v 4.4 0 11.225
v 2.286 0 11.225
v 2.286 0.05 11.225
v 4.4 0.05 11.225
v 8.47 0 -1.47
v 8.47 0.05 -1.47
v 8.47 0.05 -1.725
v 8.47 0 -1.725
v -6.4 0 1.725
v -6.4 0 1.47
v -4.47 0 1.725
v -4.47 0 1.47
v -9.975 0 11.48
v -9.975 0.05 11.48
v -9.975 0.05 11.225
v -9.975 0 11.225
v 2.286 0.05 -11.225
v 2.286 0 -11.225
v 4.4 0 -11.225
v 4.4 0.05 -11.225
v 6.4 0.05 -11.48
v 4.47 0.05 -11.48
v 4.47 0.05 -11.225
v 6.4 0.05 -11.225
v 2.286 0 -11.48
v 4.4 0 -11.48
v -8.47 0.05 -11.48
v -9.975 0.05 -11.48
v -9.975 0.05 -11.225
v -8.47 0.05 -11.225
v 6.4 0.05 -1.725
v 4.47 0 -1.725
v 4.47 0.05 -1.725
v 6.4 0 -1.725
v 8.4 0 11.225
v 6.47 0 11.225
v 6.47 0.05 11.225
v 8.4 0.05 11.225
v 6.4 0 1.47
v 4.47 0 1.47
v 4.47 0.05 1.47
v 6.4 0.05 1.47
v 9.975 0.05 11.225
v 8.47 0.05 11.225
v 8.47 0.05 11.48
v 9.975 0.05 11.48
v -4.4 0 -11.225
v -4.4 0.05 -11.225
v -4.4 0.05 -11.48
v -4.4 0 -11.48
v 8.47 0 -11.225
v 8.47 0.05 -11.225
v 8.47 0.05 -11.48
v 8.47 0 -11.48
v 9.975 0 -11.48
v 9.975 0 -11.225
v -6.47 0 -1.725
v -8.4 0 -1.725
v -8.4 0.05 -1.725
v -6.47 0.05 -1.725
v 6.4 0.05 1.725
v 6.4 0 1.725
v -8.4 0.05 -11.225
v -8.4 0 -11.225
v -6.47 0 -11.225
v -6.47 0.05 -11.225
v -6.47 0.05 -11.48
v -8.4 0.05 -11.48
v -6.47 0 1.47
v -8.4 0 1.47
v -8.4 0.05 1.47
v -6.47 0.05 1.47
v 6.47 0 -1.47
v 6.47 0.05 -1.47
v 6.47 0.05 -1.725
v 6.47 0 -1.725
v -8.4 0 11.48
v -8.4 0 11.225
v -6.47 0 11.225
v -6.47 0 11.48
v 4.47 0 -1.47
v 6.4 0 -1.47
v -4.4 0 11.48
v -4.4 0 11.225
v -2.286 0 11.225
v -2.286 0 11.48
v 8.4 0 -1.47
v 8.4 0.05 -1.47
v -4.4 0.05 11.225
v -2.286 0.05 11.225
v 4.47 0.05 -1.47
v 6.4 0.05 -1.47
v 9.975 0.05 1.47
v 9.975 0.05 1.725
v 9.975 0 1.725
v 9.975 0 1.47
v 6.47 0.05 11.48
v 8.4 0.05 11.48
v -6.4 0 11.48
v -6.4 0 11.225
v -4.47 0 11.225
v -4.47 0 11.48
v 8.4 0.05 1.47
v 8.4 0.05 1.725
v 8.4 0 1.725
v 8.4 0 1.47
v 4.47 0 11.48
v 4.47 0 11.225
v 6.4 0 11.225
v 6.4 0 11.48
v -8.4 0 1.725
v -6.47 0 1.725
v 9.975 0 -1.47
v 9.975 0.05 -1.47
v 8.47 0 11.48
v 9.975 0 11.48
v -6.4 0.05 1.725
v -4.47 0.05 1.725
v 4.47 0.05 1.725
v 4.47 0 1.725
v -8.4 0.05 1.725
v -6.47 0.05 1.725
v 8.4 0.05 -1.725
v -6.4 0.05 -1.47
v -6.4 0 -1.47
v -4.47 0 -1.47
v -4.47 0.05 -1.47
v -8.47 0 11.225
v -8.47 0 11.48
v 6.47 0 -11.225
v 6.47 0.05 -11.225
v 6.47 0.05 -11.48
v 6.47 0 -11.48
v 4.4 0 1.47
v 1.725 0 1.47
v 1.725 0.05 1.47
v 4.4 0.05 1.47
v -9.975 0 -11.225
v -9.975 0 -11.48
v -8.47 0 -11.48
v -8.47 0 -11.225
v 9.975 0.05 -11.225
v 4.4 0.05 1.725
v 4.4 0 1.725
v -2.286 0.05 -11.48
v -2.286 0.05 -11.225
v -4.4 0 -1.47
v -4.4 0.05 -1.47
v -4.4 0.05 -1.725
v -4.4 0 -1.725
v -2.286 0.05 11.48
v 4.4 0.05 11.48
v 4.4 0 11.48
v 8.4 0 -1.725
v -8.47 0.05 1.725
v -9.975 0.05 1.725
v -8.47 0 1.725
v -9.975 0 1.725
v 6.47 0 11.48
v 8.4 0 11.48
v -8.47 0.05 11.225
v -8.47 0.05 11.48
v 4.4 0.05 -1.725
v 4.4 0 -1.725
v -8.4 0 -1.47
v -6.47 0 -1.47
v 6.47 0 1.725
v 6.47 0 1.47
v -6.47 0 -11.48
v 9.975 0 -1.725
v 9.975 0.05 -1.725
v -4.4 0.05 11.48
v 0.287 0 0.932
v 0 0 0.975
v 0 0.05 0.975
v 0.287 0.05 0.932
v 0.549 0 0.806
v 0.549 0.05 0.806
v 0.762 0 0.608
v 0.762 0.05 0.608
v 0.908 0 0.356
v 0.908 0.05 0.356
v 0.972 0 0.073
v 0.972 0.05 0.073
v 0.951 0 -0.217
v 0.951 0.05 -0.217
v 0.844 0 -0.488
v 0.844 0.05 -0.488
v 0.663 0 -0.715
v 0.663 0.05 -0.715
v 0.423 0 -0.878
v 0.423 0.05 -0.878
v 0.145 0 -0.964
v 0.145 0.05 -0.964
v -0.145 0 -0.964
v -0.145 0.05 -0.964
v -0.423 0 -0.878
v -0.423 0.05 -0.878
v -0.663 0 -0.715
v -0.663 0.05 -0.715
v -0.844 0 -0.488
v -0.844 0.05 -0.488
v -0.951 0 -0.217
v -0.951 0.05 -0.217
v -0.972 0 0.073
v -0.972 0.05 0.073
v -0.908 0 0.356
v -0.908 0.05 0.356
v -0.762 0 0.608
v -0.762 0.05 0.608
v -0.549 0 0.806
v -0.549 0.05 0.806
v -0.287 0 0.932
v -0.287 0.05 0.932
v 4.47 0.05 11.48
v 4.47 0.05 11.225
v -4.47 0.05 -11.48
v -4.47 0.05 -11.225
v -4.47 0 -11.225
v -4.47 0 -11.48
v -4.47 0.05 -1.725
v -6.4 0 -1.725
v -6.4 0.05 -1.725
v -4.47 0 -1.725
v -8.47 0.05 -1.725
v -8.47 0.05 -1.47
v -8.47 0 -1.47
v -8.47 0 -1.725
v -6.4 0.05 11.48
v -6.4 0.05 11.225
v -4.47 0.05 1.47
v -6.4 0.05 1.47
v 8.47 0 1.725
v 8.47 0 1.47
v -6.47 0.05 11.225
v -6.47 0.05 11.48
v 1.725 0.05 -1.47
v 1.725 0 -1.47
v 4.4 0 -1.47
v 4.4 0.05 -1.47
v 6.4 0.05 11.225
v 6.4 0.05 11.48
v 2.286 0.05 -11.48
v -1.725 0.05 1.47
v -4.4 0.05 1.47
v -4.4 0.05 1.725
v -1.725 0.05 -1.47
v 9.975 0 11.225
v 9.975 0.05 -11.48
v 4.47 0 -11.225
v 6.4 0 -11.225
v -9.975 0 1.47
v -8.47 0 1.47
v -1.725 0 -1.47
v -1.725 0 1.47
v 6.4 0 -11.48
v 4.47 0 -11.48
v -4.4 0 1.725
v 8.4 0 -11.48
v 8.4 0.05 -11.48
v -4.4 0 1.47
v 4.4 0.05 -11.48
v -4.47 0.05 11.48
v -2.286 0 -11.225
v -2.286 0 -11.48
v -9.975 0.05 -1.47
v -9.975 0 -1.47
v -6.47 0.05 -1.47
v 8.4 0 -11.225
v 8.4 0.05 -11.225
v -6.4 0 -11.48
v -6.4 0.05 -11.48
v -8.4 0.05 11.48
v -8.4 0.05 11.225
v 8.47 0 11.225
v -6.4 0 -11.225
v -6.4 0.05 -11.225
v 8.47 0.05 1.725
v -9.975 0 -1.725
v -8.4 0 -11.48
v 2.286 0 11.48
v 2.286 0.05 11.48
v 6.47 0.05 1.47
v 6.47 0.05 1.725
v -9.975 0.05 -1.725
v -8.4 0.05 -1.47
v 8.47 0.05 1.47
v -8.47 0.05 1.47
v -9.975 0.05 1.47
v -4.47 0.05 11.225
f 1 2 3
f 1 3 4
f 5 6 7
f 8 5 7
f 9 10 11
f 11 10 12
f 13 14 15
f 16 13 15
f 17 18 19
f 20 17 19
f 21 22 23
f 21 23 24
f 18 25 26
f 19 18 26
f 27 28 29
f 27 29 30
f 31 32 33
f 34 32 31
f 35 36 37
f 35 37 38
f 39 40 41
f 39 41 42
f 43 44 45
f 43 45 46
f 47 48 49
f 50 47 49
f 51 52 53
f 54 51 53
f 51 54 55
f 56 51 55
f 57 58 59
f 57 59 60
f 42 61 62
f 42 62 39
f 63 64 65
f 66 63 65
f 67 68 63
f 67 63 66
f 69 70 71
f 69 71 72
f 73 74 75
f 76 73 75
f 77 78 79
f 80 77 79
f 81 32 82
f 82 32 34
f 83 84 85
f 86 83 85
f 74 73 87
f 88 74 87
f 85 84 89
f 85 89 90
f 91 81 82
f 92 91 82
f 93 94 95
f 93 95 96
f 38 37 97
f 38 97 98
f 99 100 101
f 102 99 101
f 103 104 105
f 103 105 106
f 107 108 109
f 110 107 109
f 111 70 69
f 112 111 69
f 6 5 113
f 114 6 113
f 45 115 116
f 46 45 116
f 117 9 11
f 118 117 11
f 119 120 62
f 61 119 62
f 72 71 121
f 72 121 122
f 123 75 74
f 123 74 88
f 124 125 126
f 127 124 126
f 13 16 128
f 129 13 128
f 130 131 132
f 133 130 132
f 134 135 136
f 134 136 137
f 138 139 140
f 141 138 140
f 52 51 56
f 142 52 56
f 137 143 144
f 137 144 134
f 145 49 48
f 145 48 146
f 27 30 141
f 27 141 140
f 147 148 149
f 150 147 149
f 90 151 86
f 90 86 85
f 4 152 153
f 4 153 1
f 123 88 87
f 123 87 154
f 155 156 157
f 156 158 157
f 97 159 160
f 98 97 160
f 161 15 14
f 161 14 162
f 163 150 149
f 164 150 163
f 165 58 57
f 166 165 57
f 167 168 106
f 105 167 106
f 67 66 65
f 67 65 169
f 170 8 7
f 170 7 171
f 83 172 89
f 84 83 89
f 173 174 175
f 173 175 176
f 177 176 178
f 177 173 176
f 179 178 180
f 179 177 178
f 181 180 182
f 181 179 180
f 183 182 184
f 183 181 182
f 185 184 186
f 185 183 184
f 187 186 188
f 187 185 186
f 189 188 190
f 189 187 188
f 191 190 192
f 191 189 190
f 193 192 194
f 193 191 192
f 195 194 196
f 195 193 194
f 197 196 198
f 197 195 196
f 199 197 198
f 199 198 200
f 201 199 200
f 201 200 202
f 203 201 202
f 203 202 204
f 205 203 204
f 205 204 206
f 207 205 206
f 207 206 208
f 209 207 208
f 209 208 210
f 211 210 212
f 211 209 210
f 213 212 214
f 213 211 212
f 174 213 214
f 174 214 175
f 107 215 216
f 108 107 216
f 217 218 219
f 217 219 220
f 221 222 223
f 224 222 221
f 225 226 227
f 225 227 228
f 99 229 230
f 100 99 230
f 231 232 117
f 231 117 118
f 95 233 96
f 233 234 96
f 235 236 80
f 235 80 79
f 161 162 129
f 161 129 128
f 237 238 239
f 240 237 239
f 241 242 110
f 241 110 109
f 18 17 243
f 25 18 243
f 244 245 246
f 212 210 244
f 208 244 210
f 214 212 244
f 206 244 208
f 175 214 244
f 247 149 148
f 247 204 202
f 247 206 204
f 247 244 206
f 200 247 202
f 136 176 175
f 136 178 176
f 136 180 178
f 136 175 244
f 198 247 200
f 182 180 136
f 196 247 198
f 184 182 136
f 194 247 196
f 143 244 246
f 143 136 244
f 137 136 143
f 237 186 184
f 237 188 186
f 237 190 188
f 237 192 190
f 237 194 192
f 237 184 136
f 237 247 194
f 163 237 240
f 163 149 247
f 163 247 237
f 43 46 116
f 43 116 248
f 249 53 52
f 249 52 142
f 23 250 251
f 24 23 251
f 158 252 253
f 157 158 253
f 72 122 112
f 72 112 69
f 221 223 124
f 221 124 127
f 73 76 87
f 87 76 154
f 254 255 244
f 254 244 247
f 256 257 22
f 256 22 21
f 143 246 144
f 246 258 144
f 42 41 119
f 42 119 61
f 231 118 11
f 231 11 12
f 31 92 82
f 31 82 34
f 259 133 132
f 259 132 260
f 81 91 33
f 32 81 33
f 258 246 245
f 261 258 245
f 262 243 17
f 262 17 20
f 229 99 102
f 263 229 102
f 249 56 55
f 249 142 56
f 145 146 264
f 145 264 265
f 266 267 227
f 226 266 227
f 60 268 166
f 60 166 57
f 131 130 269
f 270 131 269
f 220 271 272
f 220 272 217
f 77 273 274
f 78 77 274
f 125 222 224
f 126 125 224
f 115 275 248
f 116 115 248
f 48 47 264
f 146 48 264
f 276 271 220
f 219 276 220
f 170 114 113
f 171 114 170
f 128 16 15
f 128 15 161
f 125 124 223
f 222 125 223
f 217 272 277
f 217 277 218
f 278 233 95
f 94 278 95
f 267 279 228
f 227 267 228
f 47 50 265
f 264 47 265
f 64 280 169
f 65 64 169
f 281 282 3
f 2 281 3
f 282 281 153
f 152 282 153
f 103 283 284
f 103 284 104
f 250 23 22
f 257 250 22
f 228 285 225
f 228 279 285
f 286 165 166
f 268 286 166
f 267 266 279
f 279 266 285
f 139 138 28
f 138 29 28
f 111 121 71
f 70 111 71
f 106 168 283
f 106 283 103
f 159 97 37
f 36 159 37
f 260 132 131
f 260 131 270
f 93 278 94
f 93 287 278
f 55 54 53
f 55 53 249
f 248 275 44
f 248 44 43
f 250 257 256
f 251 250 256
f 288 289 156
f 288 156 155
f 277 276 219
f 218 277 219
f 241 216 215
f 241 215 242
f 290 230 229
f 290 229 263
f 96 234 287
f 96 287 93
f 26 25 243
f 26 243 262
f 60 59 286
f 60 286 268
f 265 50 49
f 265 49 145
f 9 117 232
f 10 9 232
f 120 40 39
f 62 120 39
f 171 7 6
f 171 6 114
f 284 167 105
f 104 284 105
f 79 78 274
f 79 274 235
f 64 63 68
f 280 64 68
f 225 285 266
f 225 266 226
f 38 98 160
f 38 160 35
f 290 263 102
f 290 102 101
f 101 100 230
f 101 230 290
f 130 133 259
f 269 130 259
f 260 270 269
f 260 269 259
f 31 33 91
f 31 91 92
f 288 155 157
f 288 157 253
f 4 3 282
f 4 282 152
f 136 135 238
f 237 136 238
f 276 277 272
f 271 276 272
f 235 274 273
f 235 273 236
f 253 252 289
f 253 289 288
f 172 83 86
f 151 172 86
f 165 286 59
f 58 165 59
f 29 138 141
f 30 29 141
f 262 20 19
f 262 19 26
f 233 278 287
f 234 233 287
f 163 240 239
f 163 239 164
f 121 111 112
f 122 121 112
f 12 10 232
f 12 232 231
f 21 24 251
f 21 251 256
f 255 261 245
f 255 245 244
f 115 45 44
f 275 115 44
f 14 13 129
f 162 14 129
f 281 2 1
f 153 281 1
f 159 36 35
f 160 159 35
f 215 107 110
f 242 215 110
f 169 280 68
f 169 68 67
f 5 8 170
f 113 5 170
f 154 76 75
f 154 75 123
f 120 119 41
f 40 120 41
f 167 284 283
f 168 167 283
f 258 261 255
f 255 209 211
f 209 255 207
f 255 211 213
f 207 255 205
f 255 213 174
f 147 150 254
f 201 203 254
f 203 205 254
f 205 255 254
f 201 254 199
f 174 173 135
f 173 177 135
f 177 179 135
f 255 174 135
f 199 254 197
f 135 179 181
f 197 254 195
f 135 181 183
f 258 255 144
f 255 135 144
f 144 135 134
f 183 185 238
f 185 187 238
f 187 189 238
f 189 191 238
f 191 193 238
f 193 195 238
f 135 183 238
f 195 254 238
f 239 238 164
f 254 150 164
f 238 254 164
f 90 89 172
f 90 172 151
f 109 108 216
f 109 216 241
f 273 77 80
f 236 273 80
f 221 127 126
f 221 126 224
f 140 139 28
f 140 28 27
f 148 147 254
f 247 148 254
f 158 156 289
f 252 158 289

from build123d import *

# Parameters (mm, degrees)
SKETCH1_W           = 22.96
SKETCH1_H           = 22.96
SKETCH1_W_2         = 22.45
SKETCH1_H_2         = 22.45
SKETCH1_W_3         = 9.5
SKETCH1_H_3         = 0.255
SKETCH1_W_4         = 3.45
SKETCH1_H_4         = 3.45
SKETCH1_R           = 0.975
SKETCH1_W_5         = 0.25
SKETCH1_H_5         = 1
BOSS_EXTRUDE5_DEPTH = 0.05
SKETCH2_W           = 0.07
SKETCH2_H           = 0.5
CUT_EXTRUDE1_DEPTH  = 10
SKETCH3_W           = 1.755
SKETCH3_H           = 22.96
SKETCH3_W_2         = 4.572426812
SKETCH3_H_2         = 9.755
CUT_EXTRUDE2_DEPTH  = 10


with BuildPart() as part:
    # Sketch1 → Boss-Extrude5 (new body)
    # profile 1 of 8: a face of its own
    with BuildSketch(Plane(origin=(0, 0, 0), x_dir=(1, 0, 0), z_dir=(0, 1, 0))):
        Rectangle(SKETCH1_W, SKETCH1_H)
        Rectangle(SKETCH1_W_2, SKETCH1_H_2, mode=Mode.SUBTRACT)
    # profile 2 of 8: a face of its own
    with BuildSketch(Plane(origin=(0, 0, 0), x_dir=(1, 0, 0), z_dir=(0, 1, 0))):
        with Locations((-6.475, -1.5975)):
            Rectangle(SKETCH1_W_3, SKETCH1_H_3)
    # profile 3 of 8: a face of its own
    with BuildSketch(Plane(origin=(0, 0, 0), x_dir=(1, 0, 0), z_dir=(0, 1, 0))):
        with Locations((-6.475, 1.5975)):
            Rectangle(SKETCH1_W_3, SKETCH1_H_3)
    # profile 4 of 8: a face of its own
    with BuildSketch(Plane(origin=(0, 0, 0), x_dir=(1, 0, 0), z_dir=(0, 1, 0))):
        Rectangle(SKETCH1_W_4, SKETCH1_H_4)
        with Locations(Location((0, 0, 0), (0, 0, 270))):
            Circle(SKETCH1_R, mode=Mode.SUBTRACT)
    # profile 5 of 8: a face of its own
    with BuildSketch(Plane(origin=(0, 0, 0), x_dir=(1, 0, 0), z_dir=(0, 1, 0))):
        with Locations((6.475, 1.5975)):
            Rectangle(SKETCH1_W_3, SKETCH1_H_3)
    # profile 6 of 8: a face of its own
    with BuildSketch(Plane(origin=(0, 0, 0), x_dir=(1, 0, 0), z_dir=(0, 1, 0))):
        with Locations((6.475, -1.5975)):
            Rectangle(SKETCH1_W_3, SKETCH1_H_3)
    # profile 7 of 8: a face of its own
    with BuildSketch(Plane(origin=(0, 0, 0), x_dir=(1, 0, 0), z_dir=(0, 1, 0))):
        with Locations((-11.605, -1.95)):
            Rectangle(SKETCH1_W_5, SKETCH1_H_5)
    # profile 8 of 8: a face of its own
    with BuildSketch(Plane(origin=(0, 0, 0), x_dir=(1, 0, 0), z_dir=(0, 1, 0))):
        with Locations((-11.605, 1.95)):
            Rectangle(SKETCH1_W_5, SKETCH1_H_5)
    extrude(amount=BOSS_EXTRUDE5_DEPTH)

    # Sketch2 → Cut-Extrude1 (cut)
    with BuildSketch(Plane(origin=(0, 0.05, 0), x_dir=(1, 0, 0), z_dir=(0, 1, 0))):
        with Locations((-6.435, 1.475)):
            Rectangle(SKETCH2_W, SKETCH2_H)
        with Locations((-8.435, 1.475)):
            Rectangle(SKETCH2_W, SKETCH2_H)
        with Locations((-4.435, 1.475)):
            Rectangle(SKETCH2_W, SKETCH2_H)
        with Locations((-4.435, 11.475)):
            Rectangle(SKETCH2_W, SKETCH2_H)
        with Locations((-6.435, 11.475)):
            Rectangle(SKETCH2_W, SKETCH2_H)
        with Locations((-8.435, 11.475)):
            Rectangle(SKETCH2_W, SKETCH2_H)
        with Locations((4.435, 1.475)):
            Rectangle(SKETCH2_W, SKETCH2_H)
        with Locations((6.435, 1.475)):
            Rectangle(SKETCH2_W, SKETCH2_H)
        with Locations((8.435, 1.475)):
            Rectangle(SKETCH2_W, SKETCH2_H)
        with Locations((4.435, 11.475)):
            Rectangle(SKETCH2_W, SKETCH2_H)
        with Locations((6.435, 11.475)):
            Rectangle(SKETCH2_W, SKETCH2_H)
        with Locations((8.435, 11.475)):
            Rectangle(SKETCH2_W, SKETCH2_H)
        with Locations((-8.435, -11.475)):
            Rectangle(SKETCH2_W, SKETCH2_H)
        with Locations((-6.435, -11.475)):
            Rectangle(SKETCH2_W, SKETCH2_H)
        with Locations((-4.435, -11.475)):
            Rectangle(SKETCH2_W, SKETCH2_H)
        with Locations((4.435, -11.475)):
            Rectangle(SKETCH2_W, SKETCH2_H)
        with Locations((6.435, -11.475)):
            Rectangle(SKETCH2_W, SKETCH2_H)
        with Locations((8.435, -11.475)):
            Rectangle(SKETCH2_W, SKETCH2_H)
        with Locations((8.435, -1.475)):
            Rectangle(SKETCH2_W, SKETCH2_H)
        with Locations((6.435, -1.475)):
            Rectangle(SKETCH2_W, SKETCH2_H)
        with Locations((4.435, -1.475)):
            Rectangle(SKETCH2_W, SKETCH2_H)
        with Locations((-4.435, -1.475)):
            Rectangle(SKETCH2_W, SKETCH2_H)
        with Locations((-6.435, -1.475)):
            Rectangle(SKETCH2_W, SKETCH2_H)
        with Locations((-8.435, -1.475)):
            Rectangle(SKETCH2_W, SKETCH2_H)
    extrude(amount=-CUT_EXTRUDE1_DEPTH, mode=Mode.SUBTRACT)

    # Sketch3 → Cut-Extrude2 (cut)
    with BuildSketch(Plane(origin=(0, 0.05, 0), x_dir=(1, 0, 0), z_dir=(0, 1, 0))):
        with Locations((-10.8525, 0)):
            Rectangle(SKETCH3_W, SKETCH3_H)
        with Locations((0, 6.6025)):
            Rectangle(SKETCH3_W_2, SKETCH3_H_2)
        with Locations((0, -6.6025)):
            Rectangle(SKETCH3_W_2, SKETCH3_H_2)
        with Locations((10.8525, 0)):
            Rectangle(SKETCH3_W, SKETCH3_H)
    extrude(amount=-CUT_EXTRUDE2_DEPTH, mode=Mode.SUBTRACT)


solid = part.part
